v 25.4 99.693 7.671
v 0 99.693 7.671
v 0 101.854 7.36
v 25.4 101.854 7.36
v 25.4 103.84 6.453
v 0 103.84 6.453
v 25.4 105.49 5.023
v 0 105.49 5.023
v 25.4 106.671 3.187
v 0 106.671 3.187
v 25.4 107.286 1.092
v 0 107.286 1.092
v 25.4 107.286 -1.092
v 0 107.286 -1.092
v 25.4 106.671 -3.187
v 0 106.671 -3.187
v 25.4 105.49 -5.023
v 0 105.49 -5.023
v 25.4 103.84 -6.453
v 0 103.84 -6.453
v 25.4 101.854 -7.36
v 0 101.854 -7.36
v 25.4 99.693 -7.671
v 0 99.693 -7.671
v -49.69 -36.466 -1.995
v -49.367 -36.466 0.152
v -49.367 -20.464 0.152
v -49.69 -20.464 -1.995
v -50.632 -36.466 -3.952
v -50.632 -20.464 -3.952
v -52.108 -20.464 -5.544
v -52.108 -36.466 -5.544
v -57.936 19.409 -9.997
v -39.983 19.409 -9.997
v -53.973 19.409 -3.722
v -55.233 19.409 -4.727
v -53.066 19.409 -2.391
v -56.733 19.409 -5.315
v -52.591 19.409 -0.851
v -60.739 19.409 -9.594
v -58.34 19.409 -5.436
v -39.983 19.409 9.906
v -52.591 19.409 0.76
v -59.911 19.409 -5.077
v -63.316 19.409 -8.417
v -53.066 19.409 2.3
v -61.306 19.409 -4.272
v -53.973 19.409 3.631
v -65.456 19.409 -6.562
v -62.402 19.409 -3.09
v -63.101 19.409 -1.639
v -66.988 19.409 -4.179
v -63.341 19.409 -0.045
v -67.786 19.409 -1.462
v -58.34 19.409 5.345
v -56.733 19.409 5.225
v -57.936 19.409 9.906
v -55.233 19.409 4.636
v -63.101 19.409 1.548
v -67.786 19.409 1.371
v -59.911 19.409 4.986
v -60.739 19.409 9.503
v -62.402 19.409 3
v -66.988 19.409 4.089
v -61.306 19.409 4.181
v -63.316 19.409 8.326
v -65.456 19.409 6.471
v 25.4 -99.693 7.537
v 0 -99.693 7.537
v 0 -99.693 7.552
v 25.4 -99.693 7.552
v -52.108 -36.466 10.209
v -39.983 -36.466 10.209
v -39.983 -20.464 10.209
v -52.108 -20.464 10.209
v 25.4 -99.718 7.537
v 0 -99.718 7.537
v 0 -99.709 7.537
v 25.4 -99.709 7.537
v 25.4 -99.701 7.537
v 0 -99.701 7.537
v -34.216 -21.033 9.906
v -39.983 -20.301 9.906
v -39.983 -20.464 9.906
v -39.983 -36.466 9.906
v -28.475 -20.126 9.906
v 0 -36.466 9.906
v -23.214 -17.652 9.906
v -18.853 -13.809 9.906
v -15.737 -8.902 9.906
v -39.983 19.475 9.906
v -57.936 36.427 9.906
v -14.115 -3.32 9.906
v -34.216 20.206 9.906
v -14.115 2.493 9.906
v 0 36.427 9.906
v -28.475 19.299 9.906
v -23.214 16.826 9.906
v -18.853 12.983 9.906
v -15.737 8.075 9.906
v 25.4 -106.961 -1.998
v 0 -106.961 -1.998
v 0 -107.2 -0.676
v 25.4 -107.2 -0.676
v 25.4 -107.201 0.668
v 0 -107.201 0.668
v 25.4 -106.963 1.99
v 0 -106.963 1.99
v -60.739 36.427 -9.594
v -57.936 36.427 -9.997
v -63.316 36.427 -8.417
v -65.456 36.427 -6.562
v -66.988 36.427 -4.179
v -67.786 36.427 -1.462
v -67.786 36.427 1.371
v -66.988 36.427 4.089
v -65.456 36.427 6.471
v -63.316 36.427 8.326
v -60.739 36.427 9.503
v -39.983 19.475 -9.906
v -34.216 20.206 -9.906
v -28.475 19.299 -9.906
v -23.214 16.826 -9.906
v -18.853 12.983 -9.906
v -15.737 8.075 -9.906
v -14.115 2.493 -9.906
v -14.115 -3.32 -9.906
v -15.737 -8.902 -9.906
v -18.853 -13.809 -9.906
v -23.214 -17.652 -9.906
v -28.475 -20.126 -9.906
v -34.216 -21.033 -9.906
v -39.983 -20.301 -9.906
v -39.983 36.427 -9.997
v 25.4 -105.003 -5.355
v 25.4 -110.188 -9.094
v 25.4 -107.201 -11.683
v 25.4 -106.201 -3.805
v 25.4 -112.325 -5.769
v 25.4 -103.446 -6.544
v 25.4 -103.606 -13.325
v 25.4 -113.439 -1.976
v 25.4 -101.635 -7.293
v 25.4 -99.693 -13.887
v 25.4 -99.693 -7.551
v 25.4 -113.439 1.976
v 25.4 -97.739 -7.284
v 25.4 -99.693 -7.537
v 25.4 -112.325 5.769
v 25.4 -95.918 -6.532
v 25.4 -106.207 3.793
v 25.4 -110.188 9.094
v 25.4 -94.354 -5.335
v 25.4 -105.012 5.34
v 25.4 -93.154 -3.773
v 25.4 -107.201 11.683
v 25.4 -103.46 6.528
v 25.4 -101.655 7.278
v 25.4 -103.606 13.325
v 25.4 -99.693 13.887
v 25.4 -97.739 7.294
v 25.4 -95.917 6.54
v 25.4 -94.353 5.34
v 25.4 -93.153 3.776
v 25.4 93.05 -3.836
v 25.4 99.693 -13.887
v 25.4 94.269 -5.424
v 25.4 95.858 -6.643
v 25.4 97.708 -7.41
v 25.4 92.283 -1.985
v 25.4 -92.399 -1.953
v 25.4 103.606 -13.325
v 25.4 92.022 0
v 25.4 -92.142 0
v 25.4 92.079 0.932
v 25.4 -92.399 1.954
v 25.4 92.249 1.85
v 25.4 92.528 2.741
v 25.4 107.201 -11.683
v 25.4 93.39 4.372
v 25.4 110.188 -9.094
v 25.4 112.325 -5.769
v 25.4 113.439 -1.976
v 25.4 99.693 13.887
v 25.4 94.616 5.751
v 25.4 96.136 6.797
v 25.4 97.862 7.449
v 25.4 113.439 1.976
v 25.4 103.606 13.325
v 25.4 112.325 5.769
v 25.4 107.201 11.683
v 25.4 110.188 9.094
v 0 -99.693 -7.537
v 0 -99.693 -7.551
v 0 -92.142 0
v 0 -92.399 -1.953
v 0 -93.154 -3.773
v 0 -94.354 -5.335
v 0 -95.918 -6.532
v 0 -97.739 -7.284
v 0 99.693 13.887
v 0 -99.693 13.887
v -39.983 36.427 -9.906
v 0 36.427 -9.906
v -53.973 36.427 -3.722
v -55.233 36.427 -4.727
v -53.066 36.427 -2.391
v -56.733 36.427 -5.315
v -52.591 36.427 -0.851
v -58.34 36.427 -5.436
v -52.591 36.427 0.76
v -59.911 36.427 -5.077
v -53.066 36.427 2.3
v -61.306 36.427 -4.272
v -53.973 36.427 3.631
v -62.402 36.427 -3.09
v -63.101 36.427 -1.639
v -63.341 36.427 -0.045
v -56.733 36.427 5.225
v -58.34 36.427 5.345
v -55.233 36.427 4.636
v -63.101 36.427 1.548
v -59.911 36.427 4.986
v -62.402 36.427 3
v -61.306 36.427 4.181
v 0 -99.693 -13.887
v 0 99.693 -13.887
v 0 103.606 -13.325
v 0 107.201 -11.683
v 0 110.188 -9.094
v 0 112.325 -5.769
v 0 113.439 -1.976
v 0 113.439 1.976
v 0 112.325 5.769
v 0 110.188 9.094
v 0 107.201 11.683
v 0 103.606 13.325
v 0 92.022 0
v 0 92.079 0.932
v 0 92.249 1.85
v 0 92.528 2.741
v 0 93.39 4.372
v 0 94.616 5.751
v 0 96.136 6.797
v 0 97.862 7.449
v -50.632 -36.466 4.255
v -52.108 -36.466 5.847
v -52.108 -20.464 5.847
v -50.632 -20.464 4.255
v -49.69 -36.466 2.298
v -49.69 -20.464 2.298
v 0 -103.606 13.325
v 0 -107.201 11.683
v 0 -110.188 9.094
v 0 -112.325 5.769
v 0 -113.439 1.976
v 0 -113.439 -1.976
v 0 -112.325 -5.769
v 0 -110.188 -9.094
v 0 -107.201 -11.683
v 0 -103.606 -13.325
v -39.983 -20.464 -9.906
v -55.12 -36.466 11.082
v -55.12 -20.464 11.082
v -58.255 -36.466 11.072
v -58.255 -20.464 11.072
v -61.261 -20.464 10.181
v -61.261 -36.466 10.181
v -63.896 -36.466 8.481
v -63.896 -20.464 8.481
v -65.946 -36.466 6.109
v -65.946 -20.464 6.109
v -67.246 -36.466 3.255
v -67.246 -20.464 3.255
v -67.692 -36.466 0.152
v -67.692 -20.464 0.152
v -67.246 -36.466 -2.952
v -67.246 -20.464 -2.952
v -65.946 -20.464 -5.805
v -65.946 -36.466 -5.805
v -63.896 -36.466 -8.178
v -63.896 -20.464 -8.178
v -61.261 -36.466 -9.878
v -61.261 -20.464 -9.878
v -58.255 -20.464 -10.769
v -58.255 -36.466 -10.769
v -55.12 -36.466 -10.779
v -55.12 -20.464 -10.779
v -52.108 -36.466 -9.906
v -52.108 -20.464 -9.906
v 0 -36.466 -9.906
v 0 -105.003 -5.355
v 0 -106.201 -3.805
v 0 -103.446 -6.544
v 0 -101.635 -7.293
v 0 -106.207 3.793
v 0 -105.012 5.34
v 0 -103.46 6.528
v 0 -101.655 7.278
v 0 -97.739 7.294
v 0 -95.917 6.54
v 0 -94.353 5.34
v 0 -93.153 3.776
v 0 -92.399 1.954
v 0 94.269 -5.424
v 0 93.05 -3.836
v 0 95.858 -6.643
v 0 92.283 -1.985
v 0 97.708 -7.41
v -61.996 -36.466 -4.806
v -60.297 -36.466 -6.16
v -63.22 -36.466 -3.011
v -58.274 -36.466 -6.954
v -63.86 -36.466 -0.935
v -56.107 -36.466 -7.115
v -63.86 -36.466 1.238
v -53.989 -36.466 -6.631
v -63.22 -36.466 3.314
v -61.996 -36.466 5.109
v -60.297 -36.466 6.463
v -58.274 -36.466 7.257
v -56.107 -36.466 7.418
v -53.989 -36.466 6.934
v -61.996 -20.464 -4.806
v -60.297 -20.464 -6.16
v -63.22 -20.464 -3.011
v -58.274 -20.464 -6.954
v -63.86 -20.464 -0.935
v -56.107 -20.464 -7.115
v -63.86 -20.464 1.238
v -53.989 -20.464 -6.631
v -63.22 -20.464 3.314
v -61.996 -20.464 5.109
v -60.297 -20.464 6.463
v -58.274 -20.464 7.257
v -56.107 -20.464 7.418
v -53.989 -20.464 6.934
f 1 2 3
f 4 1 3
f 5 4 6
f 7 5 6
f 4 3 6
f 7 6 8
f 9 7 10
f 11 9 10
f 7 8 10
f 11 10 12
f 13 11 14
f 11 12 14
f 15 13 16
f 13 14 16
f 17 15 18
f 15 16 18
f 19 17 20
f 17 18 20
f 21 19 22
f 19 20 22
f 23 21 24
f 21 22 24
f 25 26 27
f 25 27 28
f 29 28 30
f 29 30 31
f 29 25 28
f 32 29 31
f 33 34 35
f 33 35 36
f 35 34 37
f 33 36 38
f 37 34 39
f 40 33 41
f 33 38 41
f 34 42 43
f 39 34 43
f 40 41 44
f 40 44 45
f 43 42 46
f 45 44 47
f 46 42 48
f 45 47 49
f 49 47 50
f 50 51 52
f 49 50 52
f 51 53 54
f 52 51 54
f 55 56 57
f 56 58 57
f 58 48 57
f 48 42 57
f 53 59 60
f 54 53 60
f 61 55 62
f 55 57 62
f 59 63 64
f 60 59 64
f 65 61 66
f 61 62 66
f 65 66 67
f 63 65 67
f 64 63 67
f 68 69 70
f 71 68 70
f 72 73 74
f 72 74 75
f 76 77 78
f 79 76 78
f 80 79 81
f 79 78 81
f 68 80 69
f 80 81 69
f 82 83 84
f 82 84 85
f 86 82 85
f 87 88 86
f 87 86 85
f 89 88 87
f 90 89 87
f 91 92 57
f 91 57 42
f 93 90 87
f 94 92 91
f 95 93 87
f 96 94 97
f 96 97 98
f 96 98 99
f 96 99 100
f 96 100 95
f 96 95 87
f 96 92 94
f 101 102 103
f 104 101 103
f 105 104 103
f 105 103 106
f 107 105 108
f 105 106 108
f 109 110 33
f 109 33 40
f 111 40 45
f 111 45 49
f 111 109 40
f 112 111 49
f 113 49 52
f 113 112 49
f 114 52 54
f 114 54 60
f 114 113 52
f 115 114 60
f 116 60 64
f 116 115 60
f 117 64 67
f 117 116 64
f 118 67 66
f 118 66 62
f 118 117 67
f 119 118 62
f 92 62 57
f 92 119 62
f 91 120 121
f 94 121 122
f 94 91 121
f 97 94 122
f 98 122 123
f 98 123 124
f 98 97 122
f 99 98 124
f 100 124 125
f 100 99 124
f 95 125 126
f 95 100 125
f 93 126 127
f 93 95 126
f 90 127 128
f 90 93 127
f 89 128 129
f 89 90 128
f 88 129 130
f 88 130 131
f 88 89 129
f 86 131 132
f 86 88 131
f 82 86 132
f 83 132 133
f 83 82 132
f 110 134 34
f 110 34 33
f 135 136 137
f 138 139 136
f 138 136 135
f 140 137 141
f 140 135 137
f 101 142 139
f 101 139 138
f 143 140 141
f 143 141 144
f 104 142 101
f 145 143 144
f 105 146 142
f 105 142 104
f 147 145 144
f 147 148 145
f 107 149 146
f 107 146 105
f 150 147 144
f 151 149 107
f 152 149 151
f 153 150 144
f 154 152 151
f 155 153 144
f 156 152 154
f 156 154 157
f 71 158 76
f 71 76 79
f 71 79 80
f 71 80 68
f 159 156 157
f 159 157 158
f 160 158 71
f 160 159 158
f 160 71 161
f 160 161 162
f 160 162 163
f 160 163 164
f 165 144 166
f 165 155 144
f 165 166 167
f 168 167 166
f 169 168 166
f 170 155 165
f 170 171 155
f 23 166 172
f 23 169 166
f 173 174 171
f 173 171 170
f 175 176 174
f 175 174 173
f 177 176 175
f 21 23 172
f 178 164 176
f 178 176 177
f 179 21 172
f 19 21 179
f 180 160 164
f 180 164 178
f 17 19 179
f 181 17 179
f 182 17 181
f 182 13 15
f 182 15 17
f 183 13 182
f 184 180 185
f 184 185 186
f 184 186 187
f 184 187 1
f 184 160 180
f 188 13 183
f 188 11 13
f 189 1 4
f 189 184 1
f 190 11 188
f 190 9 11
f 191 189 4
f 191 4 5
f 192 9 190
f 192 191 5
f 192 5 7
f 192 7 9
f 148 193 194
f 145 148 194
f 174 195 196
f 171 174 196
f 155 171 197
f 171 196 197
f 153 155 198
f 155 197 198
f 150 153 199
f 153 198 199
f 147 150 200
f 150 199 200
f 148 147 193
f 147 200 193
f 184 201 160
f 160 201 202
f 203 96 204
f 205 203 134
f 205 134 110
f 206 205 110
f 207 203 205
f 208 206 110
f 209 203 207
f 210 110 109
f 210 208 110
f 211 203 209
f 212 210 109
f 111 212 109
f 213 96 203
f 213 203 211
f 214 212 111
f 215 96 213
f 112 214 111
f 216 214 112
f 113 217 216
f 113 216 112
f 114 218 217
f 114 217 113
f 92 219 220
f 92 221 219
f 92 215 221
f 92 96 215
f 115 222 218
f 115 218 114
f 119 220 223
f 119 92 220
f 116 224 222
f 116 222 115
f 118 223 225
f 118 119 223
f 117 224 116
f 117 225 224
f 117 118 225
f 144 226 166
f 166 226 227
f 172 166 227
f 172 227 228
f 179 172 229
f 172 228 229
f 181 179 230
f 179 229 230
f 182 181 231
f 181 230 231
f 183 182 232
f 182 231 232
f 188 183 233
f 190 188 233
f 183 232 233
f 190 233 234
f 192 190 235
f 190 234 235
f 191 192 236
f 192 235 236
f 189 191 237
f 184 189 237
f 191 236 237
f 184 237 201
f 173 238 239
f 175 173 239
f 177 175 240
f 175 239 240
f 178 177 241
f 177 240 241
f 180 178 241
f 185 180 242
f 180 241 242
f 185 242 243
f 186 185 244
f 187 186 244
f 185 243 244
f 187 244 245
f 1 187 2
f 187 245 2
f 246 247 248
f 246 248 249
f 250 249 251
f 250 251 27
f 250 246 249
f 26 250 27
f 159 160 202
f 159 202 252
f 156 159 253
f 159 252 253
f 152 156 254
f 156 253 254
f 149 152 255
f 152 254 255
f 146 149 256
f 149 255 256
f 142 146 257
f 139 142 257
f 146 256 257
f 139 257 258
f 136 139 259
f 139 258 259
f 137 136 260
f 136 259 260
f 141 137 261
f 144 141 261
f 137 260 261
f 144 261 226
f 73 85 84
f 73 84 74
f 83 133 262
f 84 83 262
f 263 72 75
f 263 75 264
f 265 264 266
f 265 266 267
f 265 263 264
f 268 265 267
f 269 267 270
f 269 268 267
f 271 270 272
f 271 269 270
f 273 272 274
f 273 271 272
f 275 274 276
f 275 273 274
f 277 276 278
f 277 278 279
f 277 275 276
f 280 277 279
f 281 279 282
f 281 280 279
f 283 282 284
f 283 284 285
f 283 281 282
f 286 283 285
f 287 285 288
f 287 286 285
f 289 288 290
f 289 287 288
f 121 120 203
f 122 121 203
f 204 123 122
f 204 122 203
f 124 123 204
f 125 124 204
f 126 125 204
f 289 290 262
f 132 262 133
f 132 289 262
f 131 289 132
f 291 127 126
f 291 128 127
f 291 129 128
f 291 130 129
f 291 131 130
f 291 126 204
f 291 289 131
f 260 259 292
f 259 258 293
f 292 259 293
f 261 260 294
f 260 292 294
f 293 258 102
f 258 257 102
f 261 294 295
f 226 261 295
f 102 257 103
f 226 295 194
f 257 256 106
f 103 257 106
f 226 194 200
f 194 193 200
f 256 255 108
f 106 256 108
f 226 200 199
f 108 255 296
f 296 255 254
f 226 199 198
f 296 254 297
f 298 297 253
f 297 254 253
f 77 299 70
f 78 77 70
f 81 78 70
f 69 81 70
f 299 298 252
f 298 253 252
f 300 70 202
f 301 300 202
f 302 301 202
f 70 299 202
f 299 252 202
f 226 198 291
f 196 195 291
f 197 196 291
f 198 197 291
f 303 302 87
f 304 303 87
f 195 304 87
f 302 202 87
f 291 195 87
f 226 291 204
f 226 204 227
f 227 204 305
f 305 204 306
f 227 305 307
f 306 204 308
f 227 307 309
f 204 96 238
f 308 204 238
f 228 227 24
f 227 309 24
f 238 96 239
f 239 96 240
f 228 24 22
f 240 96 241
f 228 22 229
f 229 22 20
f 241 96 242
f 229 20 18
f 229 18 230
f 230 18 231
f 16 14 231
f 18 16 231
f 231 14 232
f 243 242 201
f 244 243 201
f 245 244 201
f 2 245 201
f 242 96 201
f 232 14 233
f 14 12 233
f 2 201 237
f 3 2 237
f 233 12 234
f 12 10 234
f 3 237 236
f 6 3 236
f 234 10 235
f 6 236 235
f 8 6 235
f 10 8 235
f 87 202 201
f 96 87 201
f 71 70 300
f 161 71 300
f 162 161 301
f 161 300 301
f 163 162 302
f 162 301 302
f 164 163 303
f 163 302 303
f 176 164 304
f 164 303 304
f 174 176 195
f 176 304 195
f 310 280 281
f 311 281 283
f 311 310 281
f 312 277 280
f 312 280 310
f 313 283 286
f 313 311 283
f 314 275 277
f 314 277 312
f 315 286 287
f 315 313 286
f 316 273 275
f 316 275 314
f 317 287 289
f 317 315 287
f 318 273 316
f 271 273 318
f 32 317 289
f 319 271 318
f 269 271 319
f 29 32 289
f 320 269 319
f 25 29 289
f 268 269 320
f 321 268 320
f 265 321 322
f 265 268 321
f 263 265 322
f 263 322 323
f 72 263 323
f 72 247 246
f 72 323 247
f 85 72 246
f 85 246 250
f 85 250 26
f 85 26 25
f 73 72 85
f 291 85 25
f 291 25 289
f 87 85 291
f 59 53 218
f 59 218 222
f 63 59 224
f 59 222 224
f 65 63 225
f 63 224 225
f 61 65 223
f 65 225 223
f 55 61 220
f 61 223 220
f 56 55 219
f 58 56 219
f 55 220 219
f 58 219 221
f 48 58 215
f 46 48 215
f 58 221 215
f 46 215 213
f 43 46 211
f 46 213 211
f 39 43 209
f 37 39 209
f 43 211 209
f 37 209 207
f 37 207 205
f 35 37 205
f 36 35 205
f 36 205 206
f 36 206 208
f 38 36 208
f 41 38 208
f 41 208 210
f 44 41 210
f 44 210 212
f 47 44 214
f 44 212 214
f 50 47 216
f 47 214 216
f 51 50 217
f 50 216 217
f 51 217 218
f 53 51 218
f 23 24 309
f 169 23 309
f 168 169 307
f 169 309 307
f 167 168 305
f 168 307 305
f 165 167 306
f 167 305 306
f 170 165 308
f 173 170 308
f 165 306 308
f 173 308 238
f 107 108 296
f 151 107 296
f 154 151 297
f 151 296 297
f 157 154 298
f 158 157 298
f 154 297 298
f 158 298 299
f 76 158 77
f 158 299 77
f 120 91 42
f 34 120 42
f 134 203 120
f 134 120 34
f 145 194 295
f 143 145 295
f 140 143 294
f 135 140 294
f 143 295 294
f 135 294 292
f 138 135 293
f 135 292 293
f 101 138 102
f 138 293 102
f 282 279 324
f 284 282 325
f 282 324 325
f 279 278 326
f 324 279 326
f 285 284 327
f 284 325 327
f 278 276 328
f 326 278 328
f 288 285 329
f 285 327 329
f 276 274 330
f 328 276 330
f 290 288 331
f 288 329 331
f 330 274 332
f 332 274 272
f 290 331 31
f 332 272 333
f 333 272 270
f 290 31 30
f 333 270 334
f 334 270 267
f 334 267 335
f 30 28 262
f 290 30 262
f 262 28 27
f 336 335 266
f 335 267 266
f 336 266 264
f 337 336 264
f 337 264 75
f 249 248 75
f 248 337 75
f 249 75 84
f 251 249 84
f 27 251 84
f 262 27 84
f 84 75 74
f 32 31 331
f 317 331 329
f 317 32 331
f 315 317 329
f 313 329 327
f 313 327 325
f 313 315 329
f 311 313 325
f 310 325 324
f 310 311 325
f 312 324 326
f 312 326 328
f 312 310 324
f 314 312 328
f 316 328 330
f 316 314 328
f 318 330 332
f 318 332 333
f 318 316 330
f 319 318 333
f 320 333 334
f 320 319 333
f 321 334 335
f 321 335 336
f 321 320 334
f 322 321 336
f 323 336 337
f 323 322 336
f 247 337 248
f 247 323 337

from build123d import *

# Parameters (mm, degrees)
F1_DEPTH = 25.4
F3_DEPTH = 9.906
F4_R     = 5.4054687582
F5_DEPTH = 17.018
F7_DEPTH = 16.002


# Not quite as in the source:
# - ends of sketch curves that miss each other by under 0.0002 mm in the source are joined


with BuildPart() as f1:
    # F0 (on Right) → F1 (new body)
    with BuildSketch(Plane.YZ):
        with BuildLine():
            Line((-99.6930599213, 7.5515317731), (-99.6930599213, 13.8873864871))
            ThreePointArc((-99.6930599213, 13.8873864871), (-113.5804464084, 0), (-99.6930599213, -13.8873864871))
            Line((-99.6930599213, -13.8873864871), (-99.6930599213, -7.5509602816))
            ThreePointArc((-99.6930599213, -7.5509602816), (-104.2631477896, -6.0002098207), (-106.9606792933, -1.9984784576))
            ThreePointArc((-106.9606792933, -1.9984784576), (-107.2304460851, -0.0041593028), (-106.9628804792, 1.9904563644))
            ThreePointArc((-106.9628804792, 1.9904563644), (-104.2749842635, 5.9848237142), (-99.7176355394, 7.5373431398))
            ThreePointArc((-99.7176355394, 7.5373431398), (-99.7053477533, 7.5373772953), (-99.6930599213, 7.5373873115))
            Line((-99.6930599213, 7.5373873115), (-99.6930599213, 7.5515317731))
        make_face()
        with BuildLine():
            Line((99.6930599213, 13.8873864871), (-99.6930599213, 13.8873864871))
            Line((-99.6930599213, 13.8873864871), (-99.6930599213, 7.5515317731))
            ThreePointArc((-99.6930599213, 7.5515317731), (-94.3533205962, 5.3397393251), (-92.1415281482, 0))
            ThreePointArc((-92.1415281482, 0), (-94.3541776231, -5.33475565), (-99.6930599995, -7.5374291426))
            Line((-99.6930599995, -7.5374291426), (-99.6930599213, -7.5509602816))
            Line((-99.6930599213, -7.5509602816), (-99.6930599213, -13.8873864871))
            Line((-99.6930599213, -13.8873864871), (99.6930599213, -13.8873864871))
            Line((99.6930599213, -13.8873864871), (99.6930599213, -7.671022612))
            ThreePointArc((99.6930599213, -7.671022612), (94.2688278137, -5.4242321076), (92.0220373093, 0))
            ThreePointArc((92.0220373093, 0), (92.1497116605, 1.39373058), (92.5284847617, 2.7410674375))
            ThreePointArc((92.5284847617, 2.7410674375), (95.3446235575, 6.3194690523), (99.6930599213, 7.671022612))
            Line((99.6930599213, 7.671022612), (99.6930599213, 13.8873864871))
        make_face()
        with BuildLine():
            ThreePointArc((99.6930599213, -13.8873864871), (113.5804464084, 0), (99.6930599213, 13.8873864871))
            Line((99.6930599213, 13.8873864871), (99.6930599213, 7.671022612))
            ThreePointArc((99.6930599213, 7.671022612), (107.3640825332, 0), (99.6930599213, -7.671022612))
            Line((99.6930599213, -7.671022612), (99.6930599213, -13.8873864871))
        make_face()
    extrude(amount=F1_DEPTH)

    # F2 (on Top) → F3 (join, symmetric)
    with BuildSketch(Plane.XY):
        with BuildLine():
            Line((0, 0), (0, 36.4271812141))
            Line((0, 36.4271812141), (-39.9832986295, 36.4271812141))
            Line((-39.9832986295, 36.4271812141), (-39.9832986295, 19.475013286))
            ThreePointArc((-39.9832986295, 19.475013286), (-13.9090954175, -0.413186714), (-39.9832986295, -20.301386714))
            Line((-39.9832986295, -20.301386714), (-39.9832986295, -36.4658497274))
            Line((-39.9832986295, -36.4658497274), (0, -36.4658497274))
            Line((0, -36.4658497274), (0, -36.4271812141))
            Line((0, -36.4271812141), (0, 0))
        make_face()
    extrude(amount=F3_DEPTH, both=True)

    # F4 (on face) → F5 (join)
    with BuildSketch(Plane(origin=(0, 36.4271812141, 0), x_dir=(-1, 0, 0), z_dir=(0, 1, 0))):
        with BuildLine():
            Line((57.9356960952, 9.906), (39.9832986295, 9.906))
            Line((39.9832986295, 9.906), (39.9832986295, -9.906))
            Line((39.9832986295, -9.906), (39.9832986295, -9.9966842681))
            Line((39.9832986295, -9.9966842681), (57.9356960952, -9.9966842681))
            ThreePointArc((57.9356960952, -9.9966842681), (67.8870382293, -0.0453421341), (57.9356960952, 9.906))
        make_face()
        with Locations((57.9356960952, -0.0453421341)):
            Circle(F4_R, mode=Mode.SUBTRACT)
    extrude(amount=-F5_DEPTH)

    # F6 (on face) → F7 (join)
    with BuildSketch(Plane.XZ.offset(36.4658497274)):
        with BuildLine():
            Line((-52.1078817546, -9.906), (-39.9832986295, -9.906))
            Line((-39.9832986295, -9.906), (-39.9832986295, 9.906))
            Line((-39.9832986295, 9.906), (-39.9832986295, 10.2091357112))
            Line((-39.9832986295, 10.2091357112), (-52.1078817546, 10.2091357112))
            Line((-52.1078817546, 10.2091357112), (-52.1078817546, 5.8468863204))
            ThreePointArc((-52.1078817546, 5.8468863204), (-50.0877827712, 3.3118599928), (-49.366872241, 0.1515678556))
            ThreePointArc((-49.366872241, 0.1515678556), (-50.0877827712, -3.0087242816), (-52.1078817546, -5.5437506092))
            Line((-52.1078817546, -5.5437506092), (-52.1078817546, -9.906))
        make_face()
        with BuildLine():
            ThreePointArc((-52.1078817546, 10.2091357112), (-67.6917094663, 0.1515678556), (-52.1078817546, -9.906))
            Line((-52.1078817546, -9.906), (-52.1078817546, -5.5437506092))
            ThreePointArc((-52.1078817546, -5.5437506092), (-63.9417160607, 0.1515678556), (-52.1078817546, 5.8468863204))
            Line((-52.1078817546, 5.8468863204), (-52.1078817546, 10.2091357112))
        make_face()
    extrude(amount=-F7_DEPTH)


solid = f1.part
